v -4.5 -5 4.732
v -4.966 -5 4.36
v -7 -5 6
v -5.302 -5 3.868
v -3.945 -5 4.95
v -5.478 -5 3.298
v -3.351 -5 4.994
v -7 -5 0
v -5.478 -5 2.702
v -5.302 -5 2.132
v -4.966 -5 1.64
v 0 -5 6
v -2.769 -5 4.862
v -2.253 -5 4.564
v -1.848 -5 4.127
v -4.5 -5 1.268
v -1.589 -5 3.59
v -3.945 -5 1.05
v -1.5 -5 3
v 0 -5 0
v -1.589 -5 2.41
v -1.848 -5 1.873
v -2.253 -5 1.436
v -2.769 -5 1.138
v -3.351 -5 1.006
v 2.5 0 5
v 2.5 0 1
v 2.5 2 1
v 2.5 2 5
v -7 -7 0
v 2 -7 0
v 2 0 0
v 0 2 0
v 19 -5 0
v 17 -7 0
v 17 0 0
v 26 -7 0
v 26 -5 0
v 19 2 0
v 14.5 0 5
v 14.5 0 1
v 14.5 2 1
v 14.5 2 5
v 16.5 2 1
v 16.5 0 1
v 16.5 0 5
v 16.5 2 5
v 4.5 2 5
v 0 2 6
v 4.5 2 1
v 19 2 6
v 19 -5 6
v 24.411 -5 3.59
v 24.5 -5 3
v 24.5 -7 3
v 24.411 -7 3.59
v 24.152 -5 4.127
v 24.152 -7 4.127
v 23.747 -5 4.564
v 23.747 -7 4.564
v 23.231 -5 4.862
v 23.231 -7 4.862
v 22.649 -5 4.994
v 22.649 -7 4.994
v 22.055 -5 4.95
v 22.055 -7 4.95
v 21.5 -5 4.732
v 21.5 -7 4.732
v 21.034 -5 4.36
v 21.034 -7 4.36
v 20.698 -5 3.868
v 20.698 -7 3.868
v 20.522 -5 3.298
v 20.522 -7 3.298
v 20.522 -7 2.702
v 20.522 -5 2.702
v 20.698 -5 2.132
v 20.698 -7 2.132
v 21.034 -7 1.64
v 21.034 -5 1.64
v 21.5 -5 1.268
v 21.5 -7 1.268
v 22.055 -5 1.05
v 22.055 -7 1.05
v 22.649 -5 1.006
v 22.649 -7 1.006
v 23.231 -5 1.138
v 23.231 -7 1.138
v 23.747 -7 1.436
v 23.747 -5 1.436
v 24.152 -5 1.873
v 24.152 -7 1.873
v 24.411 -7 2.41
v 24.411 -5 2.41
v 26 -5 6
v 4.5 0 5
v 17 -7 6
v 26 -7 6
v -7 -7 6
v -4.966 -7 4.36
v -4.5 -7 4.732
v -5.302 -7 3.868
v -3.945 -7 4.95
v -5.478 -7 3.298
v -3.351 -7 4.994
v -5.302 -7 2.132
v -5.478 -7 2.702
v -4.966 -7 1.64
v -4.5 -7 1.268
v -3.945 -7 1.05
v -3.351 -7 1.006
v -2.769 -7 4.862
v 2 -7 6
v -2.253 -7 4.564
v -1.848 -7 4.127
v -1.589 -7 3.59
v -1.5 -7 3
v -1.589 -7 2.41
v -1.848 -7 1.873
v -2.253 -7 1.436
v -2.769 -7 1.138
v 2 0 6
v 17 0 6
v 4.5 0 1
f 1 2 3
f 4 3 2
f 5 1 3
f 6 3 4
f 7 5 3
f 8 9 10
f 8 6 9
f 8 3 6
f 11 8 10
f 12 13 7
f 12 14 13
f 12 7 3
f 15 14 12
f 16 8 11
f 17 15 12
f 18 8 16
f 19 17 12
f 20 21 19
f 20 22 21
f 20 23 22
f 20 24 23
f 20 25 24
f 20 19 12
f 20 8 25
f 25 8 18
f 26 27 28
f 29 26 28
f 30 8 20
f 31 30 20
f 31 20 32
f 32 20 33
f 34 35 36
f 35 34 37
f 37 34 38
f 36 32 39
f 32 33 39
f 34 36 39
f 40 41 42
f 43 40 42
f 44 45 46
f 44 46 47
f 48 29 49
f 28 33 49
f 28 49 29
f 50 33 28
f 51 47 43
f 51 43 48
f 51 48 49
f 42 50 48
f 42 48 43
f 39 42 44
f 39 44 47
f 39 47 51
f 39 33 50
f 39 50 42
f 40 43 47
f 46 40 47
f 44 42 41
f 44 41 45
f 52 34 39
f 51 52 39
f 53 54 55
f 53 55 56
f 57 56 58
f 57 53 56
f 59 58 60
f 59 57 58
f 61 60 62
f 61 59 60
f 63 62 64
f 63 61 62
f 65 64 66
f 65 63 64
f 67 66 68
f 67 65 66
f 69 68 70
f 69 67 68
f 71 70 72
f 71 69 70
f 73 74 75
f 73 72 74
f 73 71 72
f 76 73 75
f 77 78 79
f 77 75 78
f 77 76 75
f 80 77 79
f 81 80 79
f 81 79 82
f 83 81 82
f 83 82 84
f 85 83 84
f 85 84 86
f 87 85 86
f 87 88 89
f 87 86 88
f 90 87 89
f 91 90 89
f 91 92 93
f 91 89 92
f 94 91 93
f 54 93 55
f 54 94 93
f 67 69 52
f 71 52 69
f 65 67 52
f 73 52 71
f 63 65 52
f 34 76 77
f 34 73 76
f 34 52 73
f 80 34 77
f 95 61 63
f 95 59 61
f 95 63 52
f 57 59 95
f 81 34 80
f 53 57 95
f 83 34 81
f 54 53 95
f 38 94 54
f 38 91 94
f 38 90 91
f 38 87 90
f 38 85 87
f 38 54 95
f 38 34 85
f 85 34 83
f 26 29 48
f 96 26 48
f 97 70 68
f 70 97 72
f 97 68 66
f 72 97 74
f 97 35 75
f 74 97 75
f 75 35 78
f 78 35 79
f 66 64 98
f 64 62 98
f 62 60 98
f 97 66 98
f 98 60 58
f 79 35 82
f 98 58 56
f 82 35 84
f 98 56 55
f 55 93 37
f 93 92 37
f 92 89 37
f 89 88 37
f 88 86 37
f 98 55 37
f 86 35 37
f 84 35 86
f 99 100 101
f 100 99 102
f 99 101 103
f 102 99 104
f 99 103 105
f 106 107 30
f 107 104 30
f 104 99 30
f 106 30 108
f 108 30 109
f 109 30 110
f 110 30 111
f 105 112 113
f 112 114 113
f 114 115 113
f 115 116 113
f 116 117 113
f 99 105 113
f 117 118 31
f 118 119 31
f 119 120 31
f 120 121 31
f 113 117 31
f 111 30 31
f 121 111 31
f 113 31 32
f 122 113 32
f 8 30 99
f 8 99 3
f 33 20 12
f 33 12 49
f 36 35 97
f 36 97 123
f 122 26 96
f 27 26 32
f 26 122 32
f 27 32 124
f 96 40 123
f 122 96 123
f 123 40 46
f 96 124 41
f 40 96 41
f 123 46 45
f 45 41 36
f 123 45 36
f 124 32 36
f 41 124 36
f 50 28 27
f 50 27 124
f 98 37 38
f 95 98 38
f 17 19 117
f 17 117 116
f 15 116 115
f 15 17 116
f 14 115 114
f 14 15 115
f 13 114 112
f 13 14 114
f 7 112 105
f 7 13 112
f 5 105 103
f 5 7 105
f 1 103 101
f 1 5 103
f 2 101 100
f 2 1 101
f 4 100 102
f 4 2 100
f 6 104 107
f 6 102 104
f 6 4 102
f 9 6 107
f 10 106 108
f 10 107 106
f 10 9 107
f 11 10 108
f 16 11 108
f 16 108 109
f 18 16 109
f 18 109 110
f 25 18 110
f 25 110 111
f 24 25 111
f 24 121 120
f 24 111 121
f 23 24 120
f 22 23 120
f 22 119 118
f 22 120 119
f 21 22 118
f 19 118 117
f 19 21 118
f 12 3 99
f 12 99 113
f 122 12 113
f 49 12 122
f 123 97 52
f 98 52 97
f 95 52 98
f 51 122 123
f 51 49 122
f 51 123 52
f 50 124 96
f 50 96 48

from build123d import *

# Parameters (mm, degrees)
CYLINDER001_R     = 2
CYLINDER001_DEPTH = 10
BOX004_W          = 7
BOX004_H          = 2
BOX004_DEPTH      = 6
BOX002_W          = 2
BOX002_H          = 7
BOX002_DEPTH      = 6
BOX001_W          = 2
BOX001_H          = 7
BOX001_DEPTH      = 6
CYLINDER_R        = 2
CYLINDER_DEPTH    = 10
BOX003_W          = 7
BOX003_H          = 2
BOX003_DEPTH      = 6
BOX006_W          = 2
BOX006_H          = 6
BOX006_DEPTH      = 4
BOX005_W          = 2
BOX005_H          = 6
BOX005_DEPTH      = 4
BOX_W             = 19
BOX_H             = 2
BOX_DEPTH         = 6


with BuildPart() as cylinder001:
    # Cylinder001 → Cylinder001 (new body)
    with BuildSketch(Plane(origin=(22.5, 0, 3), x_dir=(1, 0, 0), z_dir=(0, -1, 0))):
        Circle(CYLINDER001_R)
    extrude(amount=CYLINDER001_DEPTH)


with BuildPart() as cut001:
    # Box004 → Box004 (new body)
    with BuildSketch(Plane(origin=(19, -7, 0), x_dir=(1, 0, 0), z_dir=(0, 0, 1))):
        with Locations((3.5, 1)):
            Rectangle(BOX004_W, BOX004_H)
    extrude(amount=BOX004_DEPTH)

    # Cut001: cut Cylinder001
    add(cylinder001.part, mode=Mode.SUBTRACT)


with BuildPart() as cube002:
    # Box002 → Box002 (new body)
    with BuildSketch(Plane(origin=(17, -7, 0), x_dir=(1, 0, 0), z_dir=(0, 0, 1))):
        with Locations((1, 3.5)):
            Rectangle(BOX002_W, BOX002_H)
    extrude(amount=BOX002_DEPTH)


with BuildPart() as cube001:
    # Box001 → Box001 (new body)
    with BuildSketch(Plane(origin=(0, -7, 0), x_dir=(1, 0, 0), z_dir=(0, 0, 1))):
        with Locations((1, 3.5)):
            Rectangle(BOX001_W, BOX001_H)
    extrude(amount=BOX001_DEPTH)


with BuildPart() as cylinder:
    # Cylinder → Cylinder (new body)
    with BuildSketch(Plane(origin=(-3.5, 0, 3), x_dir=(1, 0, 0), z_dir=(0, -1, 0))):
        Circle(CYLINDER_R)
    extrude(amount=CYLINDER_DEPTH)


with BuildPart() as fusion:
    # Box003 → Box003 (new body)
    with BuildSketch(Plane(origin=(-7, -7, 0), x_dir=(1, 0, 0), z_dir=(0, 0, 1))):
        with Locations((3.5, 1)):
            Rectangle(BOX003_W, BOX003_H)
    extrude(amount=BOX003_DEPTH)

    # Cut: cut Cylinder
    add(cylinder.part, mode=Mode.SUBTRACT)

    # Fusion: union Cube001
    add(cube001.part)


with BuildPart() as cube006:
    # Box006 → Box006 (new body)
    with BuildSketch(Plane(origin=(14.5, -3, 1), x_dir=(1, 0, 0), z_dir=(0, 0, 1))):
        with Locations((1, 3)):
            Rectangle(BOX006_W, BOX006_H)
    extrude(amount=BOX006_DEPTH)


with BuildPart() as cube005:
    # Box005 → Box005 (new body)
    with BuildSketch(Plane(origin=(2.5, -3, 1), x_dir=(1, 0, 0), z_dir=(0, 0, 1))):
        with Locations((1, 3)):
            Rectangle(BOX005_W, BOX005_H)
    extrude(amount=BOX005_DEPTH)


with BuildPart() as fusion003:
    # Box → Box (new body)
    with BuildSketch(Plane.XY):
        with Locations((9.5, 1)):
            Rectangle(BOX_W, BOX_H)
    extrude(amount=BOX_DEPTH)

    # Cut002: cut Cube005
    add(cube005.part, mode=Mode.SUBTRACT)

    # Cut003: cut Cube006
    add(cube006.part, mode=Mode.SUBTRACT)

    # Fusion001: union Fusion
    add(fusion.part)

    # Fusion002: union Cube002
    add(cube002.part)

    # Fusion003: union Cut001
    add(cut001.part)


solid = fusion003.part
